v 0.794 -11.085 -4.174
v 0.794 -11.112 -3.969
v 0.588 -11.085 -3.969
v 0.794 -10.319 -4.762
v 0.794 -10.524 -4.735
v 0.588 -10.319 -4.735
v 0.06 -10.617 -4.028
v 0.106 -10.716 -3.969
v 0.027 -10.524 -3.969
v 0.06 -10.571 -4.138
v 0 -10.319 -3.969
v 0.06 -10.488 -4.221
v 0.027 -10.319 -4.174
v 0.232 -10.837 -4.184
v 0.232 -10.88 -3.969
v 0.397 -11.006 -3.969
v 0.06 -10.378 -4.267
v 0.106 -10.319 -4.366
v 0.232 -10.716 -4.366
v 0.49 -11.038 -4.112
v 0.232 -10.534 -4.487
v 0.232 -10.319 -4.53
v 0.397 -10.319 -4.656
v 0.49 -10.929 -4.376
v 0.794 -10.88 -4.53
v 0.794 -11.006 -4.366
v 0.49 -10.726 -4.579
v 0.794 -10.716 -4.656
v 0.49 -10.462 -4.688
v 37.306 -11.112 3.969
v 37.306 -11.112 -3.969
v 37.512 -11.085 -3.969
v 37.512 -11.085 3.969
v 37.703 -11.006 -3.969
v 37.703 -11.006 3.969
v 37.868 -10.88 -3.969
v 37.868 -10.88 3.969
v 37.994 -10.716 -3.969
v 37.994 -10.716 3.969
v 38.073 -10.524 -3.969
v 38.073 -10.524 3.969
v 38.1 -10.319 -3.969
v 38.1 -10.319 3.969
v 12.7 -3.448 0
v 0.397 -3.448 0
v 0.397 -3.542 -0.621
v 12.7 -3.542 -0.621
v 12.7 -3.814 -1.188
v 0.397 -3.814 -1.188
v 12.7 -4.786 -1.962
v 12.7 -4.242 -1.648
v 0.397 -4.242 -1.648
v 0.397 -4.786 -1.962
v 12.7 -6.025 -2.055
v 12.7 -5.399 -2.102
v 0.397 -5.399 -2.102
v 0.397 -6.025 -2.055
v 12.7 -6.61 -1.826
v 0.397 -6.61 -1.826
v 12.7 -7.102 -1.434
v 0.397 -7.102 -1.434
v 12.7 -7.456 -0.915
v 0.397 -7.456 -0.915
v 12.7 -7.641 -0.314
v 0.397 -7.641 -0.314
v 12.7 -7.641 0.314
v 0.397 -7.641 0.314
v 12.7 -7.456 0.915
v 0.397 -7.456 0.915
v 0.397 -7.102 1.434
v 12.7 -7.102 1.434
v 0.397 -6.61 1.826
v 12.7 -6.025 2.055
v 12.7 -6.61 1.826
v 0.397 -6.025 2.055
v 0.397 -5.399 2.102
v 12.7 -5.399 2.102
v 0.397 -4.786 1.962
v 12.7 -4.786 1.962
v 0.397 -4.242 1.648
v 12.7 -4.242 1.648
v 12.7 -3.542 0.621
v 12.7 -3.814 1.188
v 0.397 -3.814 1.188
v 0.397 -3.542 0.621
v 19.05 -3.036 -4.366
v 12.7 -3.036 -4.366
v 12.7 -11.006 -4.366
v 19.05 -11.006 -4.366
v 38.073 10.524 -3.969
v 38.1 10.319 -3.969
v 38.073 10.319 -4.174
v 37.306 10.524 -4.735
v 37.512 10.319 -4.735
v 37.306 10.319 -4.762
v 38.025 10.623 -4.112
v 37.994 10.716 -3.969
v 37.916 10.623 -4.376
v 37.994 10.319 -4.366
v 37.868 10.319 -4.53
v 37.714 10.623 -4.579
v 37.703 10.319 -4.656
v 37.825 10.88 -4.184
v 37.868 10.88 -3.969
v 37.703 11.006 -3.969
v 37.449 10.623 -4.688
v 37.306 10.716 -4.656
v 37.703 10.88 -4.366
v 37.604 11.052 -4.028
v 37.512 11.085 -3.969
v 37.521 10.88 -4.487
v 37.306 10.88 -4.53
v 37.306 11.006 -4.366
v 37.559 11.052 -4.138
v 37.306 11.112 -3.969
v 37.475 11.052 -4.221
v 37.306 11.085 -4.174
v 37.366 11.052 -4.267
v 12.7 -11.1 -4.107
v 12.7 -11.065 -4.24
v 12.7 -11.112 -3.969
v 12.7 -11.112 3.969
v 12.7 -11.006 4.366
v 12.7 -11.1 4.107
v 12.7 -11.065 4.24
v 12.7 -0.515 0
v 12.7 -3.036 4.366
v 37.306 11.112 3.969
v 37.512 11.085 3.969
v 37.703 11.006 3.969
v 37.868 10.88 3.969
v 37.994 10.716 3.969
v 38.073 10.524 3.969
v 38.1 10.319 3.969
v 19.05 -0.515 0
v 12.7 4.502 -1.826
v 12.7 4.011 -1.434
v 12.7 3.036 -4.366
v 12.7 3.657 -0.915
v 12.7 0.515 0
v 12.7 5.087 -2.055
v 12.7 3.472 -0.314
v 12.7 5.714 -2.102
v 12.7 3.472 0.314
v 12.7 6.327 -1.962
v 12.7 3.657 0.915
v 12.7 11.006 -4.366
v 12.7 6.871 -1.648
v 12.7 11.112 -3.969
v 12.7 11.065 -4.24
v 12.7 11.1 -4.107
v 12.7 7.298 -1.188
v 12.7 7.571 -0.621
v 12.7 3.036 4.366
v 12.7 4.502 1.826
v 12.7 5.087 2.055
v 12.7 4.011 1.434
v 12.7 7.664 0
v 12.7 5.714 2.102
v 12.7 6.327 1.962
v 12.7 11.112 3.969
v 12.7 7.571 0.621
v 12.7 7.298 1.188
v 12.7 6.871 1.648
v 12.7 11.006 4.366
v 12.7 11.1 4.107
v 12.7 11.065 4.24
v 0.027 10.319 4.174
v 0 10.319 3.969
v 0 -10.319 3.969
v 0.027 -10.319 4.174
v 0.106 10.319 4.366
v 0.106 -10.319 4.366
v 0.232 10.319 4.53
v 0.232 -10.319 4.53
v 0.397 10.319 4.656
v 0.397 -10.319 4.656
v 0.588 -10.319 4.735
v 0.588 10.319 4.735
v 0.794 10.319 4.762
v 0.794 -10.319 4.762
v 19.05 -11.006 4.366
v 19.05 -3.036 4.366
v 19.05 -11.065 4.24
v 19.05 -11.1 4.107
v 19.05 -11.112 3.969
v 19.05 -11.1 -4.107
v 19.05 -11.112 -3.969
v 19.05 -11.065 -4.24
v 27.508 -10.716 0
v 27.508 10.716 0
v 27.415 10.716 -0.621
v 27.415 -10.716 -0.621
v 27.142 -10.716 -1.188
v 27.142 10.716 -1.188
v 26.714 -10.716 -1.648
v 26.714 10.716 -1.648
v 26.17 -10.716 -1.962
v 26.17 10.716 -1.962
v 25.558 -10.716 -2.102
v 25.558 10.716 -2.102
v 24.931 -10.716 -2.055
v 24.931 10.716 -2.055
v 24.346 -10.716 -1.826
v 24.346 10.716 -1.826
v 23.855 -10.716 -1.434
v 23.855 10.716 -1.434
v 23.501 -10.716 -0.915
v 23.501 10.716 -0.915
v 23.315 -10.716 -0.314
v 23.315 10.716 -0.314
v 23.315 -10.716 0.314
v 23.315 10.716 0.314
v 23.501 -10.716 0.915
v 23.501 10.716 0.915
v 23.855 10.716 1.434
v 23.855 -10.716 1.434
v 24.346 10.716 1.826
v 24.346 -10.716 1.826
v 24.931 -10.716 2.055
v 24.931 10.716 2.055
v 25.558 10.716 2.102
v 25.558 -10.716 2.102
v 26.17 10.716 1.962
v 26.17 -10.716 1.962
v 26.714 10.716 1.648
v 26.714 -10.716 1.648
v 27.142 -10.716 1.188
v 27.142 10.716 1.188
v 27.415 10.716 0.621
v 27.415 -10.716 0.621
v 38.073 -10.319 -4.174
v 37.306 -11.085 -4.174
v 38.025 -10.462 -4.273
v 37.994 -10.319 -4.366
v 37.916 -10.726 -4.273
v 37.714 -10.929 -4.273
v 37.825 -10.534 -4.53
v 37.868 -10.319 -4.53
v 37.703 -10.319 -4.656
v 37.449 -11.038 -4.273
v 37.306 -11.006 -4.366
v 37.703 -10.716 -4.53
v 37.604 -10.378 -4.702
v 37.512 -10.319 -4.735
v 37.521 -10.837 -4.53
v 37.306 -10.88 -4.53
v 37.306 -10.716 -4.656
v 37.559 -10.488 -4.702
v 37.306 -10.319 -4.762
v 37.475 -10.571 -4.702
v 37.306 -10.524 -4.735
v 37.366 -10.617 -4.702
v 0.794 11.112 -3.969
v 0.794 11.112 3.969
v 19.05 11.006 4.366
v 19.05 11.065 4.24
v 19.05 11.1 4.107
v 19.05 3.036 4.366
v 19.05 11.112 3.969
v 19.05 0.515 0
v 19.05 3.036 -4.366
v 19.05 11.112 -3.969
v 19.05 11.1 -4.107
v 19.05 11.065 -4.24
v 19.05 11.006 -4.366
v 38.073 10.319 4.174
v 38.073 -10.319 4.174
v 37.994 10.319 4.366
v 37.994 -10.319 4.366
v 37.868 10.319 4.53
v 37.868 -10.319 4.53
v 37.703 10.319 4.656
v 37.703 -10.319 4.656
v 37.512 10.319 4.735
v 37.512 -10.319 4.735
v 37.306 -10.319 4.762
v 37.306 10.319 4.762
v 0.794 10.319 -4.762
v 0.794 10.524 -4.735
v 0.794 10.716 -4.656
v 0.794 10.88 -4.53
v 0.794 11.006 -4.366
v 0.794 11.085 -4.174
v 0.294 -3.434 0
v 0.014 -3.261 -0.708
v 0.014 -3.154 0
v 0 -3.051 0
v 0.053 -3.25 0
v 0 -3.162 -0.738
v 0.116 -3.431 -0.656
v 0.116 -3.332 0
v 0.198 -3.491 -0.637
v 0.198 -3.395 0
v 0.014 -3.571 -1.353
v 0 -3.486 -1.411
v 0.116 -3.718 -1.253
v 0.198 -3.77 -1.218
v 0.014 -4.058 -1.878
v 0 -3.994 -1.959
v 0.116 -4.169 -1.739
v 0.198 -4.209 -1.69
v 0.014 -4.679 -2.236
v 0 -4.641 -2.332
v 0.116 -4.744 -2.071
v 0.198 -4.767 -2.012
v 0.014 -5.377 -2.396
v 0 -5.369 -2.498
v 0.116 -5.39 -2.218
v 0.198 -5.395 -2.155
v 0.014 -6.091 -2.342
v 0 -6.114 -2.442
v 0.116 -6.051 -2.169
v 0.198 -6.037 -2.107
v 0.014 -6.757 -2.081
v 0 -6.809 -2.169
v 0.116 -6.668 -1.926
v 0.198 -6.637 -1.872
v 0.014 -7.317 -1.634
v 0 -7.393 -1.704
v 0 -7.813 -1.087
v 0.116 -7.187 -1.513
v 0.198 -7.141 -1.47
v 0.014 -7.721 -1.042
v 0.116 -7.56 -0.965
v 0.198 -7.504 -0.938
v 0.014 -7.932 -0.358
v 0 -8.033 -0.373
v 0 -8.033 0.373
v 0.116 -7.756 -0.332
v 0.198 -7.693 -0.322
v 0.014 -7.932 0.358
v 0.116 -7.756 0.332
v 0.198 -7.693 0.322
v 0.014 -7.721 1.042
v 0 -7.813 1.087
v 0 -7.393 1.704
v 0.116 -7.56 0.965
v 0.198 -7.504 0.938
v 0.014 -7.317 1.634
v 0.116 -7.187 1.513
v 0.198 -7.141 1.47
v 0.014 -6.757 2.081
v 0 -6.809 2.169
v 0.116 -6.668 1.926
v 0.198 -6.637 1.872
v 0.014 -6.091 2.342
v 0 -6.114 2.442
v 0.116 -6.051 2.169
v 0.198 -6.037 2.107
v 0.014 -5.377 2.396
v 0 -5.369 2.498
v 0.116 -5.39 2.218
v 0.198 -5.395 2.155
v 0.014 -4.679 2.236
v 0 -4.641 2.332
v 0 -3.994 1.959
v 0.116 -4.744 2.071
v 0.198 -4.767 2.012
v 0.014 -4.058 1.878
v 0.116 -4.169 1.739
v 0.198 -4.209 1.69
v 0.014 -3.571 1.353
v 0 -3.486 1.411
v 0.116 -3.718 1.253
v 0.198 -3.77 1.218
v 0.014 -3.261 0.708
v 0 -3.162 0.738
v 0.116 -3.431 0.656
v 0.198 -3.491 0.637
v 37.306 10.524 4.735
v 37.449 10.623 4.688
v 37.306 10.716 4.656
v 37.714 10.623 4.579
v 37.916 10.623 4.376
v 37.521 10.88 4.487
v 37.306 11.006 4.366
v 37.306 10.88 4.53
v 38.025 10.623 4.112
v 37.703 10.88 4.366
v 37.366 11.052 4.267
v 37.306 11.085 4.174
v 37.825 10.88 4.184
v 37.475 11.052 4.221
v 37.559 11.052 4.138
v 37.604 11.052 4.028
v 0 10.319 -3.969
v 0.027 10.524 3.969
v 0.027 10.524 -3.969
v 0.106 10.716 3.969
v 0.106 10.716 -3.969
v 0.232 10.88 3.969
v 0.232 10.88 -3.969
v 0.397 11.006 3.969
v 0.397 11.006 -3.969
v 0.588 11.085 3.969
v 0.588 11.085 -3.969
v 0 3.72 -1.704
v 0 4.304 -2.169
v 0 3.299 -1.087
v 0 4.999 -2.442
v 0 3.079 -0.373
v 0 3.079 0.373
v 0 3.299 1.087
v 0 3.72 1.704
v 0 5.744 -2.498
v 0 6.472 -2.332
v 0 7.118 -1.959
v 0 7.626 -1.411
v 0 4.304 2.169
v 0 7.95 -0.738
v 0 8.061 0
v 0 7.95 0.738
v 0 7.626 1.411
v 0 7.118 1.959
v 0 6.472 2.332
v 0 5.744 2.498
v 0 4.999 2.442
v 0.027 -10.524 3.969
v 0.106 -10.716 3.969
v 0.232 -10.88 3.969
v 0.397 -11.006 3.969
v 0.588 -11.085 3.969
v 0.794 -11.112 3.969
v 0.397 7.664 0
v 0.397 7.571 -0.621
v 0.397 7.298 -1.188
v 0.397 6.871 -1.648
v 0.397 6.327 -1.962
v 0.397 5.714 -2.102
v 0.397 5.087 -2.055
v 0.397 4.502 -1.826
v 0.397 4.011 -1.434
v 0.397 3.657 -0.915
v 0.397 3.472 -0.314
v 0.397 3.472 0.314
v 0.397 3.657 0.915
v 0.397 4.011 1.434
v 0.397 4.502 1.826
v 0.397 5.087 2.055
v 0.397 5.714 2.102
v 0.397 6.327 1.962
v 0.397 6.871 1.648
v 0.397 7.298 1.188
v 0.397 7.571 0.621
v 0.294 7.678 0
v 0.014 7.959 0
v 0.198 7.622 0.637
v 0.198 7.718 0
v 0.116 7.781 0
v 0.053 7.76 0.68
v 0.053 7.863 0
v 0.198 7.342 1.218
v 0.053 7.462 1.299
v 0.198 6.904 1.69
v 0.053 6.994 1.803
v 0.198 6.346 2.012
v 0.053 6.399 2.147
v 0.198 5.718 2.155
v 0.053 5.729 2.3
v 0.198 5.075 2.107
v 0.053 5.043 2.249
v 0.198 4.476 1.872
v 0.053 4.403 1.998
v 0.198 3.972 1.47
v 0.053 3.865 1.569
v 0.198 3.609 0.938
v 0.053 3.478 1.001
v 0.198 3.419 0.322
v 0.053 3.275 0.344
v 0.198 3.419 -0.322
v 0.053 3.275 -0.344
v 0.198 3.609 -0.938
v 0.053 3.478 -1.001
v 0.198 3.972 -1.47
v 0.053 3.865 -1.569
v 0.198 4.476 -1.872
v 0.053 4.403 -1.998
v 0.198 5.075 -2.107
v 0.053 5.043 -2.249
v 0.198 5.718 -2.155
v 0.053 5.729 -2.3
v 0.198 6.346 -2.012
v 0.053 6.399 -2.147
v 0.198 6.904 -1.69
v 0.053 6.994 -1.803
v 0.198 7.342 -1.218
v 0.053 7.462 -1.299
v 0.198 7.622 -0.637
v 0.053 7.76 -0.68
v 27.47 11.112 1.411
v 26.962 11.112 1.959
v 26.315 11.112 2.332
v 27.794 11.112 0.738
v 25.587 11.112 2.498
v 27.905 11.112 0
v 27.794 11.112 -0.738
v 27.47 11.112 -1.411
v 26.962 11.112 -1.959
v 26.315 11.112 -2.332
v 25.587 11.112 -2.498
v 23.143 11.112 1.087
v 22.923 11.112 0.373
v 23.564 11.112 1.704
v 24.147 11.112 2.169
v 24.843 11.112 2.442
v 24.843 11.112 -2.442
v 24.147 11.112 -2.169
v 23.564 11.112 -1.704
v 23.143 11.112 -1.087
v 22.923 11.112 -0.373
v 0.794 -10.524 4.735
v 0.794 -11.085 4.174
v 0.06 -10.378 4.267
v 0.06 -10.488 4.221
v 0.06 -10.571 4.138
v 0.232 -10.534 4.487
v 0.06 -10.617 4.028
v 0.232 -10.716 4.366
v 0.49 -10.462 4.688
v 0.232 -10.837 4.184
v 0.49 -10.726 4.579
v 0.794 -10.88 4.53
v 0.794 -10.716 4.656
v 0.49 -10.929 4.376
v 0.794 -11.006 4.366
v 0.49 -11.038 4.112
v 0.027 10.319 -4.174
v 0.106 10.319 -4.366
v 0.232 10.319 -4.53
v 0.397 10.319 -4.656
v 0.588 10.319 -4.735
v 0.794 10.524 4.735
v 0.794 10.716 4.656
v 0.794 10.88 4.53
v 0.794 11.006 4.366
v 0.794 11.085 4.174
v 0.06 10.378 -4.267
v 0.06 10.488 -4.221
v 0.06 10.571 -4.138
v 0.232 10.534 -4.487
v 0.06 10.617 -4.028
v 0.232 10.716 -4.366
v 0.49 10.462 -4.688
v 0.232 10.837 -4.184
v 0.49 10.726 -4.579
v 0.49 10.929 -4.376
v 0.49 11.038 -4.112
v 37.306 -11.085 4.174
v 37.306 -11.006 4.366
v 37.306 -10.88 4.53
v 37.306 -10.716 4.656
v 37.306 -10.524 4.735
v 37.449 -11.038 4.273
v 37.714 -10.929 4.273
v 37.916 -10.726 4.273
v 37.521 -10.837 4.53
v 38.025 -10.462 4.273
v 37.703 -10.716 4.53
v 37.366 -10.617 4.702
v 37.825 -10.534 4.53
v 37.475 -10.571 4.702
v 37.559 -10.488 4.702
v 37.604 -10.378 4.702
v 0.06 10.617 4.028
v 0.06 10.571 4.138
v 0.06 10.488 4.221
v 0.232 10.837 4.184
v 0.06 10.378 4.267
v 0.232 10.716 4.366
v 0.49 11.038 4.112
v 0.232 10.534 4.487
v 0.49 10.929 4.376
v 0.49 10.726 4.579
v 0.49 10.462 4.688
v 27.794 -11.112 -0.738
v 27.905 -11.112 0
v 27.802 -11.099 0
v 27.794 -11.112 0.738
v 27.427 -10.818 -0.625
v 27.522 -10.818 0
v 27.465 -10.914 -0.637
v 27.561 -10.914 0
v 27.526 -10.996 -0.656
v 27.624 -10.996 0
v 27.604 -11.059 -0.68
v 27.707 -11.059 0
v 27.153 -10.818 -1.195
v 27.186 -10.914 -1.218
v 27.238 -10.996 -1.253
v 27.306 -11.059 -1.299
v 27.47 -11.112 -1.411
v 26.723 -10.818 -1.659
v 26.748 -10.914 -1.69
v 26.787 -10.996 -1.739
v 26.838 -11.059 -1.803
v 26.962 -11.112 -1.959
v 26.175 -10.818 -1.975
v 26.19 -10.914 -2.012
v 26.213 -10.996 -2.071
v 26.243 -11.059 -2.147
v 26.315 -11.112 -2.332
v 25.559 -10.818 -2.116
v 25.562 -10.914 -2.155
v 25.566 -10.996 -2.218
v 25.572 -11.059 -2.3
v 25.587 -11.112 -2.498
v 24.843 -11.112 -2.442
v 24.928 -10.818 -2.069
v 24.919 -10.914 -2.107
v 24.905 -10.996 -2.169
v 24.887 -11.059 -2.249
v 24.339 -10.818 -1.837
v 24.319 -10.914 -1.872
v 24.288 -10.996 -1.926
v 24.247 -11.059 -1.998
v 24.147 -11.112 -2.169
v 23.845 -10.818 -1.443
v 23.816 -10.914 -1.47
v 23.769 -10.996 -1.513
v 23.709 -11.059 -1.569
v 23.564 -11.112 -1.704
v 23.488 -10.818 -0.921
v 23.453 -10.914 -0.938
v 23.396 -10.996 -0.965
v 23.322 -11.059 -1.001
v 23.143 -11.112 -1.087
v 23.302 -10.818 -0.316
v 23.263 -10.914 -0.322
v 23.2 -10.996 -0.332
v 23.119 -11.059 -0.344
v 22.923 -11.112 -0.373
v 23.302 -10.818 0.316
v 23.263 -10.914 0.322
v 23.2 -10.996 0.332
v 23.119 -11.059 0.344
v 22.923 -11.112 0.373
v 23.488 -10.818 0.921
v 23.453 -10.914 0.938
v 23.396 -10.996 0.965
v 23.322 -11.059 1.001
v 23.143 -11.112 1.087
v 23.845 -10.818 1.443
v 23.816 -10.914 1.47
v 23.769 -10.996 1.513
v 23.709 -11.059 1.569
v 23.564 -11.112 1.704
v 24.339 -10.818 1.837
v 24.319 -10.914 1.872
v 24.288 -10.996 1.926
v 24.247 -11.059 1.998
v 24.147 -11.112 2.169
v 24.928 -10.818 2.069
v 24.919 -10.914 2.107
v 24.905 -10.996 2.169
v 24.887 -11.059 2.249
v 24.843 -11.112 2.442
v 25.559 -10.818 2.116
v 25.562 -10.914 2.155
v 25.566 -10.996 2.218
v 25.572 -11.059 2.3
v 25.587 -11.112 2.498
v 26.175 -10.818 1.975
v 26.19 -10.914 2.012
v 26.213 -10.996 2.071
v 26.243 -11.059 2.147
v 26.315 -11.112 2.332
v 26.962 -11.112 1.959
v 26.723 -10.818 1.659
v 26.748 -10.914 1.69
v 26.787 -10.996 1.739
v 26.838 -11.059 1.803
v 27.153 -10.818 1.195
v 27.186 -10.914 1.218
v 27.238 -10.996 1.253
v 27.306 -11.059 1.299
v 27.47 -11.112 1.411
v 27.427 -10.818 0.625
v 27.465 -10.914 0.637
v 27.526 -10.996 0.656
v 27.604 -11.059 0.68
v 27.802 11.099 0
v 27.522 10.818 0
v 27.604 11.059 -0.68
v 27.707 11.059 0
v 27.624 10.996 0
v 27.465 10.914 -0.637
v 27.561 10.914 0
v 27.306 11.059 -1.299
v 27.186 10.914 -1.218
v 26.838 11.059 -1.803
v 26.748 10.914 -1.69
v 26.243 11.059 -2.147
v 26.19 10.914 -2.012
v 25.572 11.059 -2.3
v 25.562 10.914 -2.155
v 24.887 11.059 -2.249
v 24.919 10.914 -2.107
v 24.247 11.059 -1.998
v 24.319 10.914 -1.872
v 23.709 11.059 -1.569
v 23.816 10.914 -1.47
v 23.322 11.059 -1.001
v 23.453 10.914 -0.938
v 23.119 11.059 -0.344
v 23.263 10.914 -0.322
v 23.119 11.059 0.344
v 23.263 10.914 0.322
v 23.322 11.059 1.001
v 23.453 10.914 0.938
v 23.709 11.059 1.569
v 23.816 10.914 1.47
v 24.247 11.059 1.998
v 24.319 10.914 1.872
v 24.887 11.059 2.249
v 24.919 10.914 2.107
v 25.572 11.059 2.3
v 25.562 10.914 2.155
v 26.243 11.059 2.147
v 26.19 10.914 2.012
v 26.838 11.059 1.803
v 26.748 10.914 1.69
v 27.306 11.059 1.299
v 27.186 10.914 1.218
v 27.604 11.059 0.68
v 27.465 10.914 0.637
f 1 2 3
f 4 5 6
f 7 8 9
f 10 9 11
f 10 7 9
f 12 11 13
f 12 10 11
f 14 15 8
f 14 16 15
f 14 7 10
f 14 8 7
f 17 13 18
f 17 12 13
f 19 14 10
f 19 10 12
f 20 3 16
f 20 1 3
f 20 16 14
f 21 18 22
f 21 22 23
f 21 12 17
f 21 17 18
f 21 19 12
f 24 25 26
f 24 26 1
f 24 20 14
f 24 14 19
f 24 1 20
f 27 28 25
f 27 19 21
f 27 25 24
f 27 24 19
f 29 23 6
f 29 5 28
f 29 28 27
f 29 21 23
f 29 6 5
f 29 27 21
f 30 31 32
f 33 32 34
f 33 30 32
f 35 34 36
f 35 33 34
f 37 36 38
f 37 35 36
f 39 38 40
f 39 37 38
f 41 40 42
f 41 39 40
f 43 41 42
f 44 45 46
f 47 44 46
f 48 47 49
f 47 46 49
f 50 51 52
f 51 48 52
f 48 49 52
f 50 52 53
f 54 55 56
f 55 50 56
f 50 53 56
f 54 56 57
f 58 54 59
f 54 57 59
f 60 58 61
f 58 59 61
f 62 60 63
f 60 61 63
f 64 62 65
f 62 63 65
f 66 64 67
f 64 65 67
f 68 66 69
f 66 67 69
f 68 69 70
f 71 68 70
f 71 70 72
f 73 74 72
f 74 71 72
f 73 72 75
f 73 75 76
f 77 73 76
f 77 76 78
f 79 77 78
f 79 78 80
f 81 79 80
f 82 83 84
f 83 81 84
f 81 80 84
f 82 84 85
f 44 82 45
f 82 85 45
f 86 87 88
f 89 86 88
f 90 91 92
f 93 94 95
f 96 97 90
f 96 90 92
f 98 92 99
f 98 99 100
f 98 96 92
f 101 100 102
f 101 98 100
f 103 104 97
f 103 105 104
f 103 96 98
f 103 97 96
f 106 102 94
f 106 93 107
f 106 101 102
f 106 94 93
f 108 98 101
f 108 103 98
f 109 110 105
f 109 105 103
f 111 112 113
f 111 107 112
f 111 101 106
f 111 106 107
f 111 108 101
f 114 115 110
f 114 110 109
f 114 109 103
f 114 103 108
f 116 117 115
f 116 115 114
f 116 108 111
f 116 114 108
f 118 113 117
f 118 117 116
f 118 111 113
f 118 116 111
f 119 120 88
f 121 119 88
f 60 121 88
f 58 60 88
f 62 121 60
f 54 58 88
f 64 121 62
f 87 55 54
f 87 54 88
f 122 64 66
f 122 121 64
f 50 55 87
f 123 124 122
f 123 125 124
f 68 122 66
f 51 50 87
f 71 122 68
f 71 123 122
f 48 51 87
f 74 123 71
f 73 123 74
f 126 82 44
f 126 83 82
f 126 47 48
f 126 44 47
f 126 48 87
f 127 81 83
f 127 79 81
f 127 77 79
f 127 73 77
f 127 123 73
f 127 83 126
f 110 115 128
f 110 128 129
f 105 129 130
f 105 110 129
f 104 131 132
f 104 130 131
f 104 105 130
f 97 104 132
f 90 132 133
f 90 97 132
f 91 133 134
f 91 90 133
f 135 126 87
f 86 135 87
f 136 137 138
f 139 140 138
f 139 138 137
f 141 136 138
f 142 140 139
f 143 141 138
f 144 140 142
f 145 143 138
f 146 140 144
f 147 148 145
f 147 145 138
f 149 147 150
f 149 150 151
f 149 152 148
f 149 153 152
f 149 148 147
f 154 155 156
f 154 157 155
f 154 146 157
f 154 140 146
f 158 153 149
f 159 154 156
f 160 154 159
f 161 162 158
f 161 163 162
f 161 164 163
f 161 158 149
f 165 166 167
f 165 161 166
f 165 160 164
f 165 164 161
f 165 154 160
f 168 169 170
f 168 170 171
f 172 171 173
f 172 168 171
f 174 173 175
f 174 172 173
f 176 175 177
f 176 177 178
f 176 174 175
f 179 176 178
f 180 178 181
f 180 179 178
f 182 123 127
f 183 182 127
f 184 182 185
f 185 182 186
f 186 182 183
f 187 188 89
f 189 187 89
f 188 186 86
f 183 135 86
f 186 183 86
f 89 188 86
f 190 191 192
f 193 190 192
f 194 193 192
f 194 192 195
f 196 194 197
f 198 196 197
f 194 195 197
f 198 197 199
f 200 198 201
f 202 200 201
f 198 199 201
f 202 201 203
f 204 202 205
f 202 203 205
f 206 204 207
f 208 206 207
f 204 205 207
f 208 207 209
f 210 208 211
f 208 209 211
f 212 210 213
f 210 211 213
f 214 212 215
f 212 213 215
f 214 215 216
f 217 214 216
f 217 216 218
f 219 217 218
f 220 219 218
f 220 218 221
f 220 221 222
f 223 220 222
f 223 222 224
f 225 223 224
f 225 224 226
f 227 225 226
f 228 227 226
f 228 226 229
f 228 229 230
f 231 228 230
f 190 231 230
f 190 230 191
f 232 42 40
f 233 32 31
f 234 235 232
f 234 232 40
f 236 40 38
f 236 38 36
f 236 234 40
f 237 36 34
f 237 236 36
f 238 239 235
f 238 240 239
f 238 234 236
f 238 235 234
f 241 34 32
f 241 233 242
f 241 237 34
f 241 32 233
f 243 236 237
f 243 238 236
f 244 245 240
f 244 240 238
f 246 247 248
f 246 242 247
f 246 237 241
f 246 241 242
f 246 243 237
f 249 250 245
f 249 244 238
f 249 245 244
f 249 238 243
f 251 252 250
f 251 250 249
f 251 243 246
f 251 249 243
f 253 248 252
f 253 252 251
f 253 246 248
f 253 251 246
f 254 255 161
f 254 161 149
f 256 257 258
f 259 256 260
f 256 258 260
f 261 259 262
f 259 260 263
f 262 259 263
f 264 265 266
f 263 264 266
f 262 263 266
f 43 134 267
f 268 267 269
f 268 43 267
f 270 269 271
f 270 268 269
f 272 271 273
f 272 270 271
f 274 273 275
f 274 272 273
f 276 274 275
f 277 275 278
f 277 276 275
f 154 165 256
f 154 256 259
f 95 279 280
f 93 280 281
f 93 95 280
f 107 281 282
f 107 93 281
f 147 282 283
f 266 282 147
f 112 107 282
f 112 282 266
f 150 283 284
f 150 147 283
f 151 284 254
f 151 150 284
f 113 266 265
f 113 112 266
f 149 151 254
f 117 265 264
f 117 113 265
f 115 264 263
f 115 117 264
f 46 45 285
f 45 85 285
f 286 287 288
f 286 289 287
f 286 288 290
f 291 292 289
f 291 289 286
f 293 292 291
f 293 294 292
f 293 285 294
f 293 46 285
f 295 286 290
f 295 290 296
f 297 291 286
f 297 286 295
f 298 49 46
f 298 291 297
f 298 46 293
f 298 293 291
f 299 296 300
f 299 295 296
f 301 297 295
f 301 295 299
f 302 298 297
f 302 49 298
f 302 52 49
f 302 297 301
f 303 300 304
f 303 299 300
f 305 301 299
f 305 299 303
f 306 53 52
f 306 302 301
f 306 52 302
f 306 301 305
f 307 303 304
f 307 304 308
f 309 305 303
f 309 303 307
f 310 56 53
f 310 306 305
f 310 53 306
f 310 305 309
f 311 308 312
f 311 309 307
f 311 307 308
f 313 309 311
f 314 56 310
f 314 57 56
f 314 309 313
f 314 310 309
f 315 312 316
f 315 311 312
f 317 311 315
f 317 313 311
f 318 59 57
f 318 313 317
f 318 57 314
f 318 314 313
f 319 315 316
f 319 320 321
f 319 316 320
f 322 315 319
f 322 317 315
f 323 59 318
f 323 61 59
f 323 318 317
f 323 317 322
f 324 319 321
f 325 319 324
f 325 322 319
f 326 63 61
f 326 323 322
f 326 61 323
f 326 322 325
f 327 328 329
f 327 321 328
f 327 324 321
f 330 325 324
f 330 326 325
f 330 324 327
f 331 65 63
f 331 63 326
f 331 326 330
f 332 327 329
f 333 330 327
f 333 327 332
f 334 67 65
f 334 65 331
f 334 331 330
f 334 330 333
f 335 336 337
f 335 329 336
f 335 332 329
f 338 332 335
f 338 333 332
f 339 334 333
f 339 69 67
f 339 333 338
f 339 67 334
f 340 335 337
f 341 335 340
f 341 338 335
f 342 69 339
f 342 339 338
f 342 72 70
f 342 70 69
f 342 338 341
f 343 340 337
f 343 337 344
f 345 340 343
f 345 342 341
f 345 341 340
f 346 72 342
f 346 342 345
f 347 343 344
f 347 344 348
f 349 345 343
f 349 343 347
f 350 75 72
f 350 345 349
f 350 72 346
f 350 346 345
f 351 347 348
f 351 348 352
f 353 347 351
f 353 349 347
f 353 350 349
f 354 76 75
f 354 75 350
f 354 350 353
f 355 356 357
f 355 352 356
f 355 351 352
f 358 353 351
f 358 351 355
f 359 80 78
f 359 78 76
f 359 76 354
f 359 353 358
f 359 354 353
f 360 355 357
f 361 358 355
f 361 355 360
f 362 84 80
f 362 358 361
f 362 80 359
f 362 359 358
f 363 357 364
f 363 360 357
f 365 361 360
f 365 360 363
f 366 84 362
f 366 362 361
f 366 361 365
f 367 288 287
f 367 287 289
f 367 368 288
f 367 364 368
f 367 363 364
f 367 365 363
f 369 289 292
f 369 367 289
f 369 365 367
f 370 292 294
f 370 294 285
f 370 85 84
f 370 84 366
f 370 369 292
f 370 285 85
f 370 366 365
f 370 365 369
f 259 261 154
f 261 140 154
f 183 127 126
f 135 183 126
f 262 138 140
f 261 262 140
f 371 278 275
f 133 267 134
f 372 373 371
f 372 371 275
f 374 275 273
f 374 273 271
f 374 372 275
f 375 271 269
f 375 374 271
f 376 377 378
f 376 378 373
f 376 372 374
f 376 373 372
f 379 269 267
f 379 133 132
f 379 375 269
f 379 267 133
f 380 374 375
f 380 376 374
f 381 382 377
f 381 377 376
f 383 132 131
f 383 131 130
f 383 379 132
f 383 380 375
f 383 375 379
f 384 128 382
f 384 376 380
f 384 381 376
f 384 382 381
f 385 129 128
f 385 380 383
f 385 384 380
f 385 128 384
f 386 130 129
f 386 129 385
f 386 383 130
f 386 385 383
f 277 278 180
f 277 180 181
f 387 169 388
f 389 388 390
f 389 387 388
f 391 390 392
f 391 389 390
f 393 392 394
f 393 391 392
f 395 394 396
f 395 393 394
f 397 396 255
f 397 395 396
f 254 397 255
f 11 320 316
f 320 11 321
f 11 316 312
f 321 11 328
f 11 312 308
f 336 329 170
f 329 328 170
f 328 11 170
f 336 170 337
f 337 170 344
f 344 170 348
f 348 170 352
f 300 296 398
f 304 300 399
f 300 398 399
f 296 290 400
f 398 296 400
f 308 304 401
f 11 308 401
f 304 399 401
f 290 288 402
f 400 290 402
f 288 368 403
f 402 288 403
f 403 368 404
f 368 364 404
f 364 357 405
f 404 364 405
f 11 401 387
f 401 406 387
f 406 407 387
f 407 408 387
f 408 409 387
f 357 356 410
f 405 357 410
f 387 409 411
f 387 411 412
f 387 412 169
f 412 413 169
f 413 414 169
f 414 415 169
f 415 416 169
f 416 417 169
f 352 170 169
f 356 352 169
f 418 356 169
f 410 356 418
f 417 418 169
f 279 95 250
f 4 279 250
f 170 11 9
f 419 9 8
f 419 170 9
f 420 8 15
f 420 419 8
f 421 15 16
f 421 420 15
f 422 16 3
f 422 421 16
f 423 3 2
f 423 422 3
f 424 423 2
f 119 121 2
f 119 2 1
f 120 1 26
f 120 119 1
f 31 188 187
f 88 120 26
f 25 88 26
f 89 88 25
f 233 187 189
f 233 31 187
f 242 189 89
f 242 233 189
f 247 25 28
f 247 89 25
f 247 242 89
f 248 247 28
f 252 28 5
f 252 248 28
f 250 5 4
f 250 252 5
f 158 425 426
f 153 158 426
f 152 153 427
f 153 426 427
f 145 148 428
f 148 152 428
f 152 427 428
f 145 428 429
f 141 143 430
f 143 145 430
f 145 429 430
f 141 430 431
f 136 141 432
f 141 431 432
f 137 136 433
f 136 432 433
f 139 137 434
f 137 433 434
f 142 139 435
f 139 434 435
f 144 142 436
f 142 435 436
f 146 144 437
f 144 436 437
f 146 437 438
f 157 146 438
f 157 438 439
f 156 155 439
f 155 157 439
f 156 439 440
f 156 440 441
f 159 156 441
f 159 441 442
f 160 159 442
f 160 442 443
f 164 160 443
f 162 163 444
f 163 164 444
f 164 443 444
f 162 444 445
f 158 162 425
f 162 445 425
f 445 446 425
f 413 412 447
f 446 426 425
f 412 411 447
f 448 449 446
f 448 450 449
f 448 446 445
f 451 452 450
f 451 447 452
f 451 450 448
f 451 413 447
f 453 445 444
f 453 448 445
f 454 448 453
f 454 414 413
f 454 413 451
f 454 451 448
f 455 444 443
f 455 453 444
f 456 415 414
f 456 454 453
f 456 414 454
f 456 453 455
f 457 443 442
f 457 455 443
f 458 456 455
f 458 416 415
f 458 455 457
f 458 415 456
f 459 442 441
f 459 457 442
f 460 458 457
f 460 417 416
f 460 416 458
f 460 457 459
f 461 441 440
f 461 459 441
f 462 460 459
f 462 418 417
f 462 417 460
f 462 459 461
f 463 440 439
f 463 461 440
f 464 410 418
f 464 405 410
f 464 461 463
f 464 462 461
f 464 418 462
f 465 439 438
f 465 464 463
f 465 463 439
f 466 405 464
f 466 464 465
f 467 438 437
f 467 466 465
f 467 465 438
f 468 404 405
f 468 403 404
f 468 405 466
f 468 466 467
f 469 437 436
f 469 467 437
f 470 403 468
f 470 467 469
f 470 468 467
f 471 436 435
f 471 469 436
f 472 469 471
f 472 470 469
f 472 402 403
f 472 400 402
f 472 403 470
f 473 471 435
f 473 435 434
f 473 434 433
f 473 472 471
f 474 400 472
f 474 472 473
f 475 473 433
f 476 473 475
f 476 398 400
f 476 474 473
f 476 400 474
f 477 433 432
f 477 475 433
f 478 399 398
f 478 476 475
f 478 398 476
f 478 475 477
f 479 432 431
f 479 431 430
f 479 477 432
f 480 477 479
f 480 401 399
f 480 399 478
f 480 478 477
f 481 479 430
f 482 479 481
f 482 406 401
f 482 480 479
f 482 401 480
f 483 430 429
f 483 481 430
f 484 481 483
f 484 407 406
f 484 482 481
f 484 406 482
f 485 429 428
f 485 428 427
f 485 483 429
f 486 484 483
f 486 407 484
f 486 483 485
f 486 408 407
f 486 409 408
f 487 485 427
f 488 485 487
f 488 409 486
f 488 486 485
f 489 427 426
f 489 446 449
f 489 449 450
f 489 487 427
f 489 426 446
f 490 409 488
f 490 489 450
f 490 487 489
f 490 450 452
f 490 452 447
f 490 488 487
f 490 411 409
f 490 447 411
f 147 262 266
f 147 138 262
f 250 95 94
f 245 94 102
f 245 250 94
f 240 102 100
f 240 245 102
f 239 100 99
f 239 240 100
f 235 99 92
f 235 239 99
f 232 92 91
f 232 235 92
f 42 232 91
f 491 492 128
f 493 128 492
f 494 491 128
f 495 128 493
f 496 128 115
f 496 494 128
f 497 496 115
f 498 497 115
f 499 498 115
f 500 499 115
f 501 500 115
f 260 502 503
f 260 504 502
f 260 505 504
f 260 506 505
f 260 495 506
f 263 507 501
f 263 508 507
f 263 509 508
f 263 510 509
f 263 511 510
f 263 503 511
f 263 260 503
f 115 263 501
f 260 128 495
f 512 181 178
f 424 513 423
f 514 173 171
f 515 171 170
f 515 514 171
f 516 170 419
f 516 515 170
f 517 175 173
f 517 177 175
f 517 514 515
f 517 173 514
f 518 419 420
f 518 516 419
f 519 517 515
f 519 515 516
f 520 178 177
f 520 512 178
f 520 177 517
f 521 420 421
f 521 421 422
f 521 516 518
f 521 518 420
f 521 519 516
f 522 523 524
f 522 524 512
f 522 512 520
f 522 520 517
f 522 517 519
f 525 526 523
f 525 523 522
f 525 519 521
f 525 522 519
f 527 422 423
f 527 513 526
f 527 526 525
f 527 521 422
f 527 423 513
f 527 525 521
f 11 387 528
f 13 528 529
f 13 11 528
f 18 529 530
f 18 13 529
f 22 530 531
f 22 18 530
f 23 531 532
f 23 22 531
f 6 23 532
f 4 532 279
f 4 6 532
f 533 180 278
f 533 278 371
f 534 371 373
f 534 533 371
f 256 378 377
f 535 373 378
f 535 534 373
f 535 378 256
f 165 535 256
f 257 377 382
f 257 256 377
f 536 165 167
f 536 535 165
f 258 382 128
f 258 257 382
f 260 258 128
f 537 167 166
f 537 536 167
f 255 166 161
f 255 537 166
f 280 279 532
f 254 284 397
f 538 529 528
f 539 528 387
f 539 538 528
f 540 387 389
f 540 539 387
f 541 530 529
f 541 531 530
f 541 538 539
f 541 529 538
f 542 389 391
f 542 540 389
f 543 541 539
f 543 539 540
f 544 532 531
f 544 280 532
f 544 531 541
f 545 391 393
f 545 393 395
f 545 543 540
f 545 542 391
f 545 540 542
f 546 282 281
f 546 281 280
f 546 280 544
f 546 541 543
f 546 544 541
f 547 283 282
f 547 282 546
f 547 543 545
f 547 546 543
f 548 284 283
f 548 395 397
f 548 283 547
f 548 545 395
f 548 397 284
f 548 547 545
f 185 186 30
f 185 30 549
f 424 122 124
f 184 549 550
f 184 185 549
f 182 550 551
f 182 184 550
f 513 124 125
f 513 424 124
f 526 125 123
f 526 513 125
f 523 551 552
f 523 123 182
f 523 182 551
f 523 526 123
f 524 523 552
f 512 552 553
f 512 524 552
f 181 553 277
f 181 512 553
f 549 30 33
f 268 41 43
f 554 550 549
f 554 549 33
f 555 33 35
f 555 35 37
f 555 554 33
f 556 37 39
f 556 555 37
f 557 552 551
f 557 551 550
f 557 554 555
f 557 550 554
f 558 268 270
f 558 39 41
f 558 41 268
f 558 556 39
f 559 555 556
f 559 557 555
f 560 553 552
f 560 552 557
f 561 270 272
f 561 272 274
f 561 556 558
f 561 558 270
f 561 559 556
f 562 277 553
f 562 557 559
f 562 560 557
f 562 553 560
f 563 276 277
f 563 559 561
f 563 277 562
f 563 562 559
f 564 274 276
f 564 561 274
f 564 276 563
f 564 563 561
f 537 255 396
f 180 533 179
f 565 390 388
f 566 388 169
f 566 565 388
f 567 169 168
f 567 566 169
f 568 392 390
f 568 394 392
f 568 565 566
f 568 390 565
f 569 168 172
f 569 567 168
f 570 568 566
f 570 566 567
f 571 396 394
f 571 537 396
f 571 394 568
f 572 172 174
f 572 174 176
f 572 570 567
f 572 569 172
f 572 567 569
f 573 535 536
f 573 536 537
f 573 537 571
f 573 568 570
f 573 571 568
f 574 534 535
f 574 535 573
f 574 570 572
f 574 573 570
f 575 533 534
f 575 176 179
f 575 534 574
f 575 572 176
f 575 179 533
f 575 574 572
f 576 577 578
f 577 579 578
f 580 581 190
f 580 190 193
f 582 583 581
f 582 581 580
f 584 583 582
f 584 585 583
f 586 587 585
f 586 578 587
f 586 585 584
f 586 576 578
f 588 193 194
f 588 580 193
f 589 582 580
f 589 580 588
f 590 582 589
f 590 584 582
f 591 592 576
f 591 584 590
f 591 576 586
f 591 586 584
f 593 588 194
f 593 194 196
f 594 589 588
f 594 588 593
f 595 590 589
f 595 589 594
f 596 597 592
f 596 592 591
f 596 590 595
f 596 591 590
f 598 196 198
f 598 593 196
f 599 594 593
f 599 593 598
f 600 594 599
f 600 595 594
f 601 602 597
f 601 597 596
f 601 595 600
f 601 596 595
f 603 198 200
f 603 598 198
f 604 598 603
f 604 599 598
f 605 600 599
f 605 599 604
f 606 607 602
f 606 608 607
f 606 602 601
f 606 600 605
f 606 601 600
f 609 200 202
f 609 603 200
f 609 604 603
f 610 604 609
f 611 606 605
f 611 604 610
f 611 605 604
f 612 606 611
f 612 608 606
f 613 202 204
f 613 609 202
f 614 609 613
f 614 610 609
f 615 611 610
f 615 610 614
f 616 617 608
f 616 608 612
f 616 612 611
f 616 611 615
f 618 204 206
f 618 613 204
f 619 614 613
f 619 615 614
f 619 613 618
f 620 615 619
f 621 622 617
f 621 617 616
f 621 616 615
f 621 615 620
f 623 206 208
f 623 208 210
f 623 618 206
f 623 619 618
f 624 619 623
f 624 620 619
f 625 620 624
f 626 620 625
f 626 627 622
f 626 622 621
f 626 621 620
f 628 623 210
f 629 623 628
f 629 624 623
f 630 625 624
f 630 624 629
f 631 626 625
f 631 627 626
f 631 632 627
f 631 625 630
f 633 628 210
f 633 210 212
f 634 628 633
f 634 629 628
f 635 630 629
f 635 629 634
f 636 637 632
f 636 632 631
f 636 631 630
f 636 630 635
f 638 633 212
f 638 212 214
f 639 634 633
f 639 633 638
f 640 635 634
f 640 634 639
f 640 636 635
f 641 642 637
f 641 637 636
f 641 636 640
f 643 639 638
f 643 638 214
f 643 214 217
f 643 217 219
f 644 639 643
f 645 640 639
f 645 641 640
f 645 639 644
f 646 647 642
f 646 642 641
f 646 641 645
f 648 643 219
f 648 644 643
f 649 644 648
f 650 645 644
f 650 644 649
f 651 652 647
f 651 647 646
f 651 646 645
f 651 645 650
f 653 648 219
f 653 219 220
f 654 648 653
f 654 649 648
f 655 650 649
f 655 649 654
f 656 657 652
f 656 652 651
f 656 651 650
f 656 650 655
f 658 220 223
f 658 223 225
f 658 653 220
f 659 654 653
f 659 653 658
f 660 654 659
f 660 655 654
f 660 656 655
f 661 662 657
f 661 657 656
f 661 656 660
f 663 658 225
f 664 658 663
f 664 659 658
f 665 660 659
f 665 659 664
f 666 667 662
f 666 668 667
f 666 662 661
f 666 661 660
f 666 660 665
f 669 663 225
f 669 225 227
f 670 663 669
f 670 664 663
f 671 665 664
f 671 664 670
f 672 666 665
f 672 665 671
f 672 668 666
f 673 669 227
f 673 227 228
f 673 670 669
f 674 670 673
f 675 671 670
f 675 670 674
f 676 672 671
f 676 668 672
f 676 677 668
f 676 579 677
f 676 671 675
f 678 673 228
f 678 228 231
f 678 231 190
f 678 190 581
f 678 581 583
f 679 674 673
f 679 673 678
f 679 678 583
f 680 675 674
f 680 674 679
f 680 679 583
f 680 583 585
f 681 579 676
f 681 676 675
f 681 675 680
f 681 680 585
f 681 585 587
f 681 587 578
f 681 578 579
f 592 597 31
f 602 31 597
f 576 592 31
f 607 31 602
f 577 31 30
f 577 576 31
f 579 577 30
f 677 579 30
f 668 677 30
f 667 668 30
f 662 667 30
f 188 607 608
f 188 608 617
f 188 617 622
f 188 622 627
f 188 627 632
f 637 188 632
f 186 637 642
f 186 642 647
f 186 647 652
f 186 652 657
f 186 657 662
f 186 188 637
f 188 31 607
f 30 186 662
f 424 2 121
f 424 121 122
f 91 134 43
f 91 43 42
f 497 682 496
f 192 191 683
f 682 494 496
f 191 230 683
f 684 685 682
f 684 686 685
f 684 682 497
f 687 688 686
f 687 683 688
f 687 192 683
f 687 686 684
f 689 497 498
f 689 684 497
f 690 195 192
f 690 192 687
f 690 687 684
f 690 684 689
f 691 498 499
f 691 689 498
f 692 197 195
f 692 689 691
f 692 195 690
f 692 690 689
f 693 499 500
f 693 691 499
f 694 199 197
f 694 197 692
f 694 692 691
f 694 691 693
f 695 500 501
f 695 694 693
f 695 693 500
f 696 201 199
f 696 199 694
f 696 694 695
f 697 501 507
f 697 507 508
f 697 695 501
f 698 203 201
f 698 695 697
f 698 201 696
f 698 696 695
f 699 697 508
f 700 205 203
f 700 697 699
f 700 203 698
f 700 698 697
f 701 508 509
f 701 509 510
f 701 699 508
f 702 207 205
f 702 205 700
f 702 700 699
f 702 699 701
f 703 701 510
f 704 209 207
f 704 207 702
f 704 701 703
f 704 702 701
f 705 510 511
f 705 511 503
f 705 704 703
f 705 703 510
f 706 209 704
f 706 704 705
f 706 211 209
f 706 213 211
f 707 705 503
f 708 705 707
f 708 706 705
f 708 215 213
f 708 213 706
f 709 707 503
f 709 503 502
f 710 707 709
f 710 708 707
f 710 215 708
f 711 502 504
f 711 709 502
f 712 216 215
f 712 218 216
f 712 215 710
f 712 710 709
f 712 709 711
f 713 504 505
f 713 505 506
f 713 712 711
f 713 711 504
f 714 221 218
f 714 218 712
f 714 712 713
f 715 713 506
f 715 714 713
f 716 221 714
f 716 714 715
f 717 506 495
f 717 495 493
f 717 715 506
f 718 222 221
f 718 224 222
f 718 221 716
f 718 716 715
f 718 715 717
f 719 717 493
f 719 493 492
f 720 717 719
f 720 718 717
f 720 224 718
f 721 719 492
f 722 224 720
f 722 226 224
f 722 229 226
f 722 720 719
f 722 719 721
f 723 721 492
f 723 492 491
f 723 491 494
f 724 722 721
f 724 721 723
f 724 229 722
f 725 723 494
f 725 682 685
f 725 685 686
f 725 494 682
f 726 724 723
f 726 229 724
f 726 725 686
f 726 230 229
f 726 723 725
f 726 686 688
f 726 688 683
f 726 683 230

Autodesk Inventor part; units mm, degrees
ref_plane "YZ Plane" through (0, 0, 0) normal (1, 0, 0) x (0, 1, 0)
ref_plane "XZ Plane" through (0, 0, 0) normal (0, 1, 0) x (-1, 0, 0)
ref_plane "XY Plane" through (0, 0, 0) normal (0, 0, 1) x (1, 0, 0)
sketch "Sketch1" plane through (0, 0, 0) normal (1, 0, 0) x (0, 1, 0)
  line L0 (-11.1125, -4.7625) -> (11.1125, -4.7625)
  line L1 (11.1125, -4.7625) -> (11.1125, 4.7625)
  line L2 (11.1125, 4.7625) -> (-11.1125, 4.7625)
  line L3 (-11.1125, 4.7625) -> (-11.1125, -4.7625)
  line L4 (-11.1125, -4.7625) -> (11.1125, 4.7625) construction
  line L5 (11.1125, -4.7625) -> (-11.1125, 4.7625) construction
  circle A0 centre (5.5563, 0) radius 2.1082
  circle A1 centre (-5.5562, 0) radius 2.1082
  point P0 (0, 0)
  point P1 (-11.1125, 0)
  dimension "d0" = 9.525
  dimension "d1" = 22.225
  dimension "d2" = 4.2164
  dimension "d3" = 4.2164
  dimension "d4" = 5.5563
  dimension "d5" = 5.5563
extrude "Extrusion1" add sketch "Sketch1" along normal blind 12.7
sketch "Sketch2" plane through (12.7, 0, 0) normal (1, 0, 0) x (0, 0, -1)
  circle A0 centre (0, 5.5563) radius 2.1082 projected
  line L0 (0, 10.5972) -> (4.3656, 8.0767)
  line L1 (4.3656, 8.0767) -> (4.3656, 3.0358)
  line L2 (4.3656, 3.0358) -> (0, 0.5153)
  line L3 (0, 0.5153) -> (-4.3656, 3.0358)
  line L4 (-4.3656, 3.0358) -> (-4.3656, 8.0767)
  line L5 (-4.3656, 8.0767) -> (0, 10.5972)
  circle A1 centre (0, -5.5562) radius 2.1082 projected
  line L6 (0, -0.5153) -> (4.3656, -3.0358)
  line L7 (4.3656, -3.0358) -> (4.3656, -8.0767)
  line L8 (4.3656, -8.0767) -> (0, -10.5972)
  line L9 (0, -10.5972) -> (-4.3656, -8.0767)
  line L10 (-4.3656, -8.0767) -> (-4.3656, -3.0358)
  line L11 (-4.3656, -3.0358) -> (0, -0.5153)
  line L12 (4.7625, 11.1125) -> (-4.7625, 11.1125) projected
  line L13 (-4.7625, 11.1125) -> (-4.7625, -11.1125) projected
  line L14 (-4.7625, -11.1125) -> (4.7625, -11.1125) projected
  line L15 (4.7625, -11.1125) -> (4.7625, 11.1125) projected
  circle A2 centre (0, 5.5563) radius 2.1082 projected
  circle A3 centre (0, -5.5562) radius 2.1082 projected
  line L16 (-4.3656, 8.0767) -> (4.3656, 8.0767)
  line L17 (4.3656, 8.0767) -> (4.3656, 13.7838)
  line L18 (4.3656, 13.7838) -> (-4.3656, 13.7838)
  line L19 (-4.3656, 13.7838) -> (-4.3656, 8.0767)
  line L20 (-4.3656, -8.0767) -> (4.3656, -8.0767)
  line L21 (4.3656, -8.0767) -> (4.3656, -13.1177)
  line L22 (4.3656, -13.1177) -> (-4.3656, -13.1177)
  line L23 (-4.3656, -13.1177) -> (-4.3656, -8.0767)
  point P0 (-4.3656, 11.1125)
  point P1 (-4.3656, -11.1125)
  point P2 (4.3656, -11.1125)
  point P3 (4.3656, 11.1125)
  dimension "d10" = 4.3656
  dimension "d11" = 4.3656
extrude "Extrusion2" add sketch "Sketch2" along normal blind 6.35 contours L17 L12 L15 L14 L21 L7 L6 L11 L10 L23 L13 L19 L4 L3 L2 L1
sketch "Sketch3" plane through (19.05, 0, 0) normal (1, 0, 0) x (0, 0, -1)
  line L0 (-4.7625, 11.1125) -> (-4.7625, -11.1125) projected
  line L1 (4.7625, -11.1125) -> (-4.7625, -11.1125)
  line L2 (-4.7625, -11.1125) -> (-4.7625, 11.1125)
  line L3 (-4.7625, 11.1125) -> (4.7625, 11.1125)
  line L4 (4.7625, 11.1125) -> (4.7625, -11.1125)
  line L5 (4.7625, -11.1125) -> (-4.7625, 11.1125) construction
  line L6 (-4.7625, -11.1125) -> (4.7625, 11.1125) construction
  point P0 (0, 0)
extrude "Extrusion3" add sketch "Sketch3" along normal blind 19.05
sketch "Sketch4" plane through (0, 11.1125, 4.7625) normal (0, 1, 0) x (1, 0, 0)
  circle A0 centre (25.4, 4.7625) radius 2.1082
  line L0 (38.1, 9.525) -> (38.1, 0) projected
  line L1 (0, 9.525) -> (0, 0) projected
  point P0 (0, 4.7625)
  dimension "d16" = 4.2164
  dimension "d25" = 25.4
extrude "Extrusion4" cut sketch "Sketch4" against normal blind 25.4
fillet "Fillet1" radius 0.7937 4 edges at (38.1, 0, -4.7625) (38.1, 11.1125, 0) (38.1, 0, 4.7625) (38.1, -11.1125, 0)
fillet "Fillet2" radius 0.7937 8 edges at (37.8675, 10.88, -4.53) (18.6531, 11.1125, -4.7625) (37.8675, 10.88, 4.53) (18.6531, 11.1125, 4.7625) (37.8675, -10.88, -4.53) (18.6531, -11.1125, -4.7625) (37.8675, -10.88, 4.53) (18.6531, -11.1125, 4.7625)
fillet "Fillet3" radius 0.7937 8 edges at (0, 10.88, 4.53) (0, 0, 4.7625) (0, -10.88, 4.53) (0, -11.1125, 0) (0, -10.88, -4.53) (0, 0, -4.7625) (0, 10.88, -4.53) (0, 11.1125, 0)
fillet "Fillet4" radius 0.3969 2 edges at (23.2918, 11.1125, 0) (23.2918, -11.1125, 0)
fillet "Fillet5" radius 0.3969 2 edges at (0, 3.4481, 0) (0, -7.6644, 0)
properties part number ".5x1 Tube Stock Insert" material "PBT Plastic"
